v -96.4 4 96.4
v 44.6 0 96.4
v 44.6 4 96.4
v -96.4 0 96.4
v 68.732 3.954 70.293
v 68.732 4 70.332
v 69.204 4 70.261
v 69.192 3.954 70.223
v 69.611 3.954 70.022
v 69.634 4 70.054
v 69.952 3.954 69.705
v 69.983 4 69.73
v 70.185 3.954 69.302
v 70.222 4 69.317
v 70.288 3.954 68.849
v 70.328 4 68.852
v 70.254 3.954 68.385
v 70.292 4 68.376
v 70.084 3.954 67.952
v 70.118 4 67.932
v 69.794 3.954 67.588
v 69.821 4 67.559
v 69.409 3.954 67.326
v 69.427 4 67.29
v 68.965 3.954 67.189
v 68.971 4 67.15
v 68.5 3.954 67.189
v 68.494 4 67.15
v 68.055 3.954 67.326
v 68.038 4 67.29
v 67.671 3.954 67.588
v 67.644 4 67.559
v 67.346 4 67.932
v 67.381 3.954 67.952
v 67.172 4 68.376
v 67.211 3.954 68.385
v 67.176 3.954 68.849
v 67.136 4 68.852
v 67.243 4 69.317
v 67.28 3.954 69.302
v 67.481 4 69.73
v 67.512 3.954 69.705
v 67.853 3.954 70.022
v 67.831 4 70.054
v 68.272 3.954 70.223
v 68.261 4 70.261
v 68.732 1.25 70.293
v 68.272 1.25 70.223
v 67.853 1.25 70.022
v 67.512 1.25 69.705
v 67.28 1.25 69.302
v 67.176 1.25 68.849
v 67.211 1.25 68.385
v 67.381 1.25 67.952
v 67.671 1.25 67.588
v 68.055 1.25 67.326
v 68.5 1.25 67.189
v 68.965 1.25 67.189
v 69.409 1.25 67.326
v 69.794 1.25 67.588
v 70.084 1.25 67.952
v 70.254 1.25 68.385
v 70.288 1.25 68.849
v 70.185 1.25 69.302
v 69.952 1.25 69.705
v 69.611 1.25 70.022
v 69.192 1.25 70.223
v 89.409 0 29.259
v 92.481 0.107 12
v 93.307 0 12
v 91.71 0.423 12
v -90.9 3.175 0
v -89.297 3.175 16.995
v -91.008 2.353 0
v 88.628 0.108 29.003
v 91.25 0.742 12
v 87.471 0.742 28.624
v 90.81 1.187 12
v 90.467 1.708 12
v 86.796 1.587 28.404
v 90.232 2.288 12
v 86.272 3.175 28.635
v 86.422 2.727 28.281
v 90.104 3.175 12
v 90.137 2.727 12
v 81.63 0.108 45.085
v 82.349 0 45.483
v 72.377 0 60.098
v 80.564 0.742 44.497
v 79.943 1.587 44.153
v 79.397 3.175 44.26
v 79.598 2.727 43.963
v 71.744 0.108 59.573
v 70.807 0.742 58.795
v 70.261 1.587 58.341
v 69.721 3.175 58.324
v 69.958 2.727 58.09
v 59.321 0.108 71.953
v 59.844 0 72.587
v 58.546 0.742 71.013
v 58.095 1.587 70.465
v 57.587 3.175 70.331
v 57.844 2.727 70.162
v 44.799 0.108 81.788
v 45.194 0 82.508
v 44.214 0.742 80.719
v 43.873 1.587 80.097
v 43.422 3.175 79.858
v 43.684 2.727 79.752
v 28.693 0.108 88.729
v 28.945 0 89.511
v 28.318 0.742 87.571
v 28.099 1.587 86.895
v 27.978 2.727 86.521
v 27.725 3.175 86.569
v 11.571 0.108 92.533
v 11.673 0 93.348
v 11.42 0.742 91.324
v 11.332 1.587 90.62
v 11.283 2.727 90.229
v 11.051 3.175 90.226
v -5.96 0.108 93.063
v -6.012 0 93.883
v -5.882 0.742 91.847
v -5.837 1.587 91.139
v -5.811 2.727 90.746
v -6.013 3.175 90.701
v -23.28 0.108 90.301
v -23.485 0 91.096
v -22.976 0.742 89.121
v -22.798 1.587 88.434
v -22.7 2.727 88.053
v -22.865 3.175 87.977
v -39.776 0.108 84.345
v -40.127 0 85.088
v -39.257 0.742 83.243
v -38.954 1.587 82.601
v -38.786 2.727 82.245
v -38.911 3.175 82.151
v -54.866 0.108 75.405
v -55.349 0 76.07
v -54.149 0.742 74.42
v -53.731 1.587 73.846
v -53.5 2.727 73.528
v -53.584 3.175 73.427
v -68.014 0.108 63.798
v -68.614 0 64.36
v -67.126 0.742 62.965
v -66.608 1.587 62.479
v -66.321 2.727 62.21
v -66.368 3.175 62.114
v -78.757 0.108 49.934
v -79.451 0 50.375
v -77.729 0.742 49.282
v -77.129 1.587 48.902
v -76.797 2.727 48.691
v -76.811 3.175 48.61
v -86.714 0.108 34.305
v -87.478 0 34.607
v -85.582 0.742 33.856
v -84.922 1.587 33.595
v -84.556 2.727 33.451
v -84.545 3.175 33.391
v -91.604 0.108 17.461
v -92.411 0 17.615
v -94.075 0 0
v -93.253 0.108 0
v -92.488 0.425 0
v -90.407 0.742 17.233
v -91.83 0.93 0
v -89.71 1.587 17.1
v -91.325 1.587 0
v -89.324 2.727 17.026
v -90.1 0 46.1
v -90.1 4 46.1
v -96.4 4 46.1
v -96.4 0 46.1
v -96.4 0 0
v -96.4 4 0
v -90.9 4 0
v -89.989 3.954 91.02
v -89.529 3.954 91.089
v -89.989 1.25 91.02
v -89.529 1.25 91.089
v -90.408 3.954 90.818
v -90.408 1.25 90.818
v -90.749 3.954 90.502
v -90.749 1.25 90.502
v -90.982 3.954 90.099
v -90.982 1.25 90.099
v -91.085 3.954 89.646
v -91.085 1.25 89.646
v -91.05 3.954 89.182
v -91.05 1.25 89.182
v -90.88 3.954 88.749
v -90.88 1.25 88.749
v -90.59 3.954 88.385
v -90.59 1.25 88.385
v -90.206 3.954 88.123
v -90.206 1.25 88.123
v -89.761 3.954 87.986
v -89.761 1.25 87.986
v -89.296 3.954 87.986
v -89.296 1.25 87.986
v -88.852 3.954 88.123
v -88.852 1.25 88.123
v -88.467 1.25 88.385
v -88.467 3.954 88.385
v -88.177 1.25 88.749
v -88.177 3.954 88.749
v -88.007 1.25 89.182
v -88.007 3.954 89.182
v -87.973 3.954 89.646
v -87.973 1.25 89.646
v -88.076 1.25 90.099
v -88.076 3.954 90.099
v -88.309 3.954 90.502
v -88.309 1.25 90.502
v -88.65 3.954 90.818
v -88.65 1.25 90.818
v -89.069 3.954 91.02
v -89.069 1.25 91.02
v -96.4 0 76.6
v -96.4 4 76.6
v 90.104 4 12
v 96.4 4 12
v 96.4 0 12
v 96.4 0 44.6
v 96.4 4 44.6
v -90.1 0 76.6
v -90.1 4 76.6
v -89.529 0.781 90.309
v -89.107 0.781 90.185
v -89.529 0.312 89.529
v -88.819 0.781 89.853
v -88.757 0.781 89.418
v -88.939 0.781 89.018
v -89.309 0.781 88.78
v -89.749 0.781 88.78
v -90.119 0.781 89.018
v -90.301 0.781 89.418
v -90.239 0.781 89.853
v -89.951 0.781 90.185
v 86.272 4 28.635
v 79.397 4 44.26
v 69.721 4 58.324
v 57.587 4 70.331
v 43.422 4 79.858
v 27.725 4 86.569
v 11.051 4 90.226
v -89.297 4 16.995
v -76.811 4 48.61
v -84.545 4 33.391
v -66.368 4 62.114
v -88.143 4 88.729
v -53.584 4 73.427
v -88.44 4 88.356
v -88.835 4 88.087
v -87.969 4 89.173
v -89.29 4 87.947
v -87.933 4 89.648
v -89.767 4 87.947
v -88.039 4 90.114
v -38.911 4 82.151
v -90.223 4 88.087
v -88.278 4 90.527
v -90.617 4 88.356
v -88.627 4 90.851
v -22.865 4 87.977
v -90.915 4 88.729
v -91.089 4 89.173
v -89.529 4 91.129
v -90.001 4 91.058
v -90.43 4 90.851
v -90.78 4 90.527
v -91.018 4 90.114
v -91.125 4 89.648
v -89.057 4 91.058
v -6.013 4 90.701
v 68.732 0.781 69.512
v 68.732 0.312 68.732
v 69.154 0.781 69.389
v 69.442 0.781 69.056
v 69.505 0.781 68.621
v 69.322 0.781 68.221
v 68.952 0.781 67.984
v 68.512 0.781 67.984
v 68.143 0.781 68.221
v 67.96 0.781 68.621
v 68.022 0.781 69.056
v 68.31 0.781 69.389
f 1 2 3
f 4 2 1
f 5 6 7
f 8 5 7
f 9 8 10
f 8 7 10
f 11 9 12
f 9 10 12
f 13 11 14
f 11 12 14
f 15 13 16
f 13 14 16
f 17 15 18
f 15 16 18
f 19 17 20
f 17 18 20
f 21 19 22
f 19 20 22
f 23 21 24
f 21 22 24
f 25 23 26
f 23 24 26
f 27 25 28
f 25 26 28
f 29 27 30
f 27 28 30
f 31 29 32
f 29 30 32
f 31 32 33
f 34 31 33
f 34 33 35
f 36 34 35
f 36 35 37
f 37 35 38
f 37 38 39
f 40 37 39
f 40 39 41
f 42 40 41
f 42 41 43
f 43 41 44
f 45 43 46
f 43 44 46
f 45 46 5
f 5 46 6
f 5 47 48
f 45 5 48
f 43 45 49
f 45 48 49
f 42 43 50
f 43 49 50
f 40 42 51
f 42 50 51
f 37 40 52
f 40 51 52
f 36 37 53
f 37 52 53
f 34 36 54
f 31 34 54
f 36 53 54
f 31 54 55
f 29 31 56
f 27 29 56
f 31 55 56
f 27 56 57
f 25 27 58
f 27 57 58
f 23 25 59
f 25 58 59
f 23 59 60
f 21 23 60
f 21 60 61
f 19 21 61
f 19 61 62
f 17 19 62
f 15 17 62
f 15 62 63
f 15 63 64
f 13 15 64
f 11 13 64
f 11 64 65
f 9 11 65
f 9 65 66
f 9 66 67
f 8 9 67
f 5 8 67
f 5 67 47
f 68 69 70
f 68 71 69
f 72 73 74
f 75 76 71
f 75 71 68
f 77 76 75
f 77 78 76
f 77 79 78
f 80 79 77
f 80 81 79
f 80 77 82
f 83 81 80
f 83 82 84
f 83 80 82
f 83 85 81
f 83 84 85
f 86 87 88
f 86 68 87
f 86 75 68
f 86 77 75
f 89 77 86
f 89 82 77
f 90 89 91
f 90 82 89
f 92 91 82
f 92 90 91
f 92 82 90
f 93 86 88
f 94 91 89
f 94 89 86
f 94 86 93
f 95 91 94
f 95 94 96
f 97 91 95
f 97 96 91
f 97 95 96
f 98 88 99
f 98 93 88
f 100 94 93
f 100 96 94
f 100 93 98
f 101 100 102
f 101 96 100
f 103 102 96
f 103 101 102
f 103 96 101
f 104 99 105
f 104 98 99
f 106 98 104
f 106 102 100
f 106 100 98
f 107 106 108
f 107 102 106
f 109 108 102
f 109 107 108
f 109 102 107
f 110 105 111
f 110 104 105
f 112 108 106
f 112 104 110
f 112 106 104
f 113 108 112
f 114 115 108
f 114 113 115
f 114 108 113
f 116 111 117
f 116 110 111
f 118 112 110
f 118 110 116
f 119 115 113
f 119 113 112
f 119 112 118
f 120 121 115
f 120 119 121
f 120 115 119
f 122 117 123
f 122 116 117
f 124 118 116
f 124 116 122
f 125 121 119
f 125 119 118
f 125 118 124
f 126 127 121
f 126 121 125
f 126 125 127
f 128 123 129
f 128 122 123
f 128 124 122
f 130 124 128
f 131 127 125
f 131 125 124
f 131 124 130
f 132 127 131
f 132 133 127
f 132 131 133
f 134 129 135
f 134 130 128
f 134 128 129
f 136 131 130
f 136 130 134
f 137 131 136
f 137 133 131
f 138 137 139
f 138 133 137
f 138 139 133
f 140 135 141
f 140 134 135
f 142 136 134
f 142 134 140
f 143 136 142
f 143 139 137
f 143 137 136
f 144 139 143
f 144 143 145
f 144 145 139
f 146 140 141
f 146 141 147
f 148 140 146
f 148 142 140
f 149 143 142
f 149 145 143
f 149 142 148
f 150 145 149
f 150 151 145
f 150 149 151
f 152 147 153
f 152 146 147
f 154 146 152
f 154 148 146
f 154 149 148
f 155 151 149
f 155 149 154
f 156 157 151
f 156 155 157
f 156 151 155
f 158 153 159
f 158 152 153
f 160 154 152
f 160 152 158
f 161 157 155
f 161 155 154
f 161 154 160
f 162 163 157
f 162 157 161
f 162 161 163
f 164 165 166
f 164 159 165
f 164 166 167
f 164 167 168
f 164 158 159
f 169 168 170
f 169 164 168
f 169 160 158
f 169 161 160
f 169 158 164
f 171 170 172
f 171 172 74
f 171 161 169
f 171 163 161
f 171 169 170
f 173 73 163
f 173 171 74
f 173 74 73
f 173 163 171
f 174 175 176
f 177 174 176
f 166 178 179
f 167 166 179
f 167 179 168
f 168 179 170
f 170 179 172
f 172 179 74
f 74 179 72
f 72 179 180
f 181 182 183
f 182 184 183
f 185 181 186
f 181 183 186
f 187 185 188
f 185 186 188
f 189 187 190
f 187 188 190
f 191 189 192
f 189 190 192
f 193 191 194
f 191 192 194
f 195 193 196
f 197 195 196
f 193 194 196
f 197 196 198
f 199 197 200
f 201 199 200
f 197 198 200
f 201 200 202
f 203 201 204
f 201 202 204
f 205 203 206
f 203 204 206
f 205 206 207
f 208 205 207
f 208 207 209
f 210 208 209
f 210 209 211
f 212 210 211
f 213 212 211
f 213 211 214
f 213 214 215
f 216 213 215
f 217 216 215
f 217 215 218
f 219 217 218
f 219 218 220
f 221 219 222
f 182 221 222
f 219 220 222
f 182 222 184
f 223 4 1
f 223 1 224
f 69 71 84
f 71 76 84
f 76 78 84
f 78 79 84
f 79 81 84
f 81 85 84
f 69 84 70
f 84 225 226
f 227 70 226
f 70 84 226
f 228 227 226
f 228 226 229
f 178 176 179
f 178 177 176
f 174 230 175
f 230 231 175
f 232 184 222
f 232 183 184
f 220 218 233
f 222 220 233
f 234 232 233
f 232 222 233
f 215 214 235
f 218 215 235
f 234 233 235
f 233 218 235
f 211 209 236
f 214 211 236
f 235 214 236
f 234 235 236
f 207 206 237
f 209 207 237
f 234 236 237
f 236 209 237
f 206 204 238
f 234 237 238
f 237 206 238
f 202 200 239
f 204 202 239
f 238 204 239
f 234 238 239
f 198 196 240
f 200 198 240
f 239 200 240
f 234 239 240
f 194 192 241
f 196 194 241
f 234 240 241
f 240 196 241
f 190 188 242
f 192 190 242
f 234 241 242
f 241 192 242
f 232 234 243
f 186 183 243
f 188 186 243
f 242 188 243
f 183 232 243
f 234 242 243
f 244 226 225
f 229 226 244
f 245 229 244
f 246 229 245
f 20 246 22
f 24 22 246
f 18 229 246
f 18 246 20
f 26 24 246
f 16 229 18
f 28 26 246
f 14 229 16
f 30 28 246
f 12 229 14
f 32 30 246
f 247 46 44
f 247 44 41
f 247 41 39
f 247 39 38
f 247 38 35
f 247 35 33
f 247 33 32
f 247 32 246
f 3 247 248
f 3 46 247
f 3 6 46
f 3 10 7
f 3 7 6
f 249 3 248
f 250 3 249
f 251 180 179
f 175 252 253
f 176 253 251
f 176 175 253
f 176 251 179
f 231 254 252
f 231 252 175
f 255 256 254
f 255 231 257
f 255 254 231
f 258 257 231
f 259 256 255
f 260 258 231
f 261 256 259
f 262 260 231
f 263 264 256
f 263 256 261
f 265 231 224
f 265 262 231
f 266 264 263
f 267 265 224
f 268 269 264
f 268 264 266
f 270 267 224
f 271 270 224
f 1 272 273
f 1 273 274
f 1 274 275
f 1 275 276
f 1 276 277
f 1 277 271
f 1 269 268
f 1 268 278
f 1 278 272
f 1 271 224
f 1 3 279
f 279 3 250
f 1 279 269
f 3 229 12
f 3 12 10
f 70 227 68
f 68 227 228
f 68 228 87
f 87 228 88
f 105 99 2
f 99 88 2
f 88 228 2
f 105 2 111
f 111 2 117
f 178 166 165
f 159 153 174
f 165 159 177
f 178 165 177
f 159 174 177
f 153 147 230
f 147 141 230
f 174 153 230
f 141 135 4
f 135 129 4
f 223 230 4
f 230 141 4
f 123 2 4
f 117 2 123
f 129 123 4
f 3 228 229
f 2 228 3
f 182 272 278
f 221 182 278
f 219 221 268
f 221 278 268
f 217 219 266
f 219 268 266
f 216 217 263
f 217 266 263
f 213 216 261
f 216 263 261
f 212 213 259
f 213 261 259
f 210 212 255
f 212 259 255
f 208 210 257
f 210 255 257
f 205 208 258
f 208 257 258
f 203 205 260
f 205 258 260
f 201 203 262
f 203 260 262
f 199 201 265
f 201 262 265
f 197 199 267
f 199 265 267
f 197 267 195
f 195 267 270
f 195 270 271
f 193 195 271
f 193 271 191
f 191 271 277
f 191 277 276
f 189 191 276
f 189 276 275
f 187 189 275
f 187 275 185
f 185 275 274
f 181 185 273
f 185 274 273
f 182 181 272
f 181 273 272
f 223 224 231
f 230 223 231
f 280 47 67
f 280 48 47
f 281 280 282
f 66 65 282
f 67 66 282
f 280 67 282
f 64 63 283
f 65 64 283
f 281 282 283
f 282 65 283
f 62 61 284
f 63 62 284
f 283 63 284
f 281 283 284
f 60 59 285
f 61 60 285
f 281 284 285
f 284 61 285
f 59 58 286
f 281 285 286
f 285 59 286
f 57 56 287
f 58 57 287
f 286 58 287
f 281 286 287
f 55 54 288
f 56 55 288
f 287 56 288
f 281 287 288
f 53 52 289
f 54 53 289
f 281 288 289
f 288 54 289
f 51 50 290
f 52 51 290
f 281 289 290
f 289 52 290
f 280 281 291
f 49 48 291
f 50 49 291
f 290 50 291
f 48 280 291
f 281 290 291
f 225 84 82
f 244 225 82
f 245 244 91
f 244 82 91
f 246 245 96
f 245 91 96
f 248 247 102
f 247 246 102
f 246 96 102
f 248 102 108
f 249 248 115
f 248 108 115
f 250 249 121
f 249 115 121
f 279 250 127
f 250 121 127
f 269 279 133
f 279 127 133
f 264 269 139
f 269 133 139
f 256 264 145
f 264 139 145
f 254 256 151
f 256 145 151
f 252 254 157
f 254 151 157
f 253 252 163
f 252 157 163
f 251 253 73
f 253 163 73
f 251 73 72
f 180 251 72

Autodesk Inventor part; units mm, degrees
ref_plane "YZ Plane" through (0, 0, 0) normal (1, 0, 0) x (0, 1, 0)
ref_plane "XZ Plane" through (0, 0, 0) normal (0, 1, 0) x (-1, 0, 0)
ref_plane "XY Plane" through (0, 0, 0) normal (0, 0, 1) x (1, 0, 0)
sketch "Sketch1" plane through (0, 0, 0) normal (0, 1, 0) x (-1, 0, 0)
  line L0 (101.6, -101.6) -> (-101.6, -101.6)
  line L1 (-101.6, -101.6) -> (-101.6, 101.6)
  line L2 (-101.6, 101.6) -> (101.6, 101.6)
  line L3 (101.6, 101.6) -> (101.6, -101.6)
  line L4 (96.6, -96.6) -> (-96.6, -96.6)
  line L5 (-96.6, -96.6) -> (-96.6, 96.6)
  line L6 (-96.6, 96.6) -> (96.6, 96.6)
  line L7 (96.6, 96.6) -> (96.6, -96.6)
  line L8 (101.6, 101.6) -> (-40.4, 101.6)
  circle A0 centre (0, 0) radius 88.9
  line L9 (-40.4, 101.6) -> (-101.6, 40.4)
  line L10 (-45.4, 101.6) -> (-101.6, 45.4)
  line L11 (96.6, 96.6) -> (96.6, 101.6)
  line L12 (-45.4, 101.6) -> (-35.4, 101.6)
  line L13 (-35.4, 101.6) -> (-35.4, 96.6)
  line L14 (-35.4, 96.6) -> (-45.4, 96.6)
  line L15 (-45.4, 96.6) -> (-45.4, 101.6)
  line L16 (-101.6, 39.4) -> (-39.4, 101.6)
  line L17 (96.4, -96.4) -> (-96.4, -96.4)
  line L18 (-96.4, -96.4) -> (-96.4, 96.4)
  line L19 (-96.4, 96.4) -> (96.4, 96.4)
  line L20 (96.4, 96.4) -> (96.4, -96.4)
  circle A1 centre (0, 0) radius 90.9
  point P0 (96.6, 51.2168)
  point P1 (101.6, 40.4)
  point P2 (101.6, -40.4)
  point P3 (96.6, -51.2168)
  point P4 (-96.6, 45.4)
  point P5 (-45.4, 96.6)
  point P6 (-44.6, 96.4)
  point P7 (-96.4, 44.6)
  dimension "d0" = 203.2
  dimension "d1" = 203.2
  dimension "d2" = 101.6
  dimension "d3" = 101.6
  dimension "d4" = 5
  dimension "d5" = 5
  dimension "d6" = 5
  dimension "d7" = 5
  dimension "d8" = 142
  dimension "d9" = 61.2
  dimension "d10" = 177.8
  dimension "d11" = 5
  dimension "d12" = 5
  dimension "d13" = 10
  dimension "d14" = 1
  dimension "d15" = 0.2
  dimension "d16" = 0.2
  dimension "d17" = 0.2
  dimension "d18" = 0.2
  dimension "d64" = 181.8
extrude "Extrusion1" add sketch "Sketch1" along normal blind 4 contours L16 L19 L20 L17 L18
sketch "Sketch6" plane through (0, 4, 0) normal (0, 1, 0) x (1, 0, 0)
  line L0 (96.4, 96.4) -> (-96.4, 96.4) projected
  line L1 (96.4, 96.4) -> (88.4, 96.4)
  line L2 (88.4, 96.4) -> (88.4, -45.6)
  line L3 (88.4, -45.6) -> (96.4, -45.6)
  line L4 (96.4, -45.6) -> (96.4, 96.4)
  line L5 (96.4, -44.6) -> (96.4, 96.4) projected
  line L6 (88.4, -12) -> (96.4, -12)
  line L7 (96.4, -12) -> (96.4, 12)
  line L8 (96.4, 12) -> (88.4, 12)
  line L9 (88.4, 12) -> (88.4, -12)
  line L10 (0, 0) -> (96.4, 0)
  point P0 (96.4, -12)
  dimension "d58" = 8
  dimension "d59" = 142
  dimension "d62" = 12
  dimension "d63" = 12
extrude "Extrusion6" cut sketch "Sketch6" against normal blind 25.4 contours L4 L10 L2 L8 | L4 L6 L2 L10
sketch "Sketch8" plane through (0, 4, 0) normal (0, 1, 0) x (1, 0, 0)
  line L0 (-96.6, 96.6) -> (-96.6, -96.6)
  line L1 (96.6, 96.6) -> (-96.6, 96.6)
  line L2 (-96.6, 96.6) -> (96.6, 96.6)
  line L3 (96.6, -45.4) -> (45.4, -96.6)
  line L4 (96.6, 96.6) -> (96.6, -45.4)
  line L5 (96.6, -45.4) -> (45.4, -96.6)
  line L6 (45.4, -96.6) -> (-96.6, -96.6)
  line L7 (-96.6, -96.6) -> (-96.6, 96.6)
  line L8 (-96.6, 96.6) -> (-89.5289, 89.5289)
  circle A0 centre (-89.5289, 89.5289) radius 5
  circle A1 centre (-89.5289, 89.5289) radius 1.5
  line L9 (-89.5289, 84.5289) -> (-96.6, 84.5289)
  line L10 (-89.5289, 89.5289) -> (-89.5289, 84.5289)
  line L11 (-89.5289, 89.5289) -> (-84.5289, 89.5289)
  line L12 (-84.5289, 96.6) -> (-84.5289, 89.5289)
  line L13 (-96.6, -96.6) -> (-89.5289, -89.5289)
  line L14 (-96.6, -96.6) -> (-86.6, -96.6) construction
  circle A2 centre (-89.5289, -89.5289) radius 5
  circle A3 centre (-89.5289, -89.5289) radius 1.75
  line L15 (-89.5289, -89.5289) -> (-84.5289, -89.5289)
  line L16 (-84.5289, -96.6) -> (-84.5289, -89.5289)
  line L17 (-89.5289, -89.5289) -> (-89.5289, -84.5289)
  line L18 (-96.6, -84.5289) -> (-89.5289, -84.5289)
  line L19 (96.6, 96.6) -> (89.5289, 89.5289)
  circle A4 centre (89.5289, 89.5289) radius 5
  circle A5 centre (89.5289, 89.5289) radius 1.75
  line L20 (89.5289, 89.5289) -> (84.5289, 89.5289)
  line L21 (84.5289, 96.6) -> (84.5289, 89.5289)
  line L22 (89.5289, 89.5289) -> (89.5289, 84.5289)
  line L23 (96.6, 84.5289) -> (89.5289, 84.5289)
  line L24 (96.6, -43.114) -> (96.6, 96.6)
  line L25 (-96.6, -96.6) -> (43.1178, -96.6)
  line L26 (28.9914, 5.6569) -> (-5.6569, -28.9914)
  line L27 (25.4, -25.4) -> (101.6, -25.4)
  line L28 (101.6, -88.9) -> (101.6, 101.6)
  line L29 (25.4, -25.4) -> (25.4, -101.6)
  line L30 (43.1178, -101.6) -> (-101.6, -101.6)
  line L31 (96.6, -25.4) -> (86.6, -25.4)
  circle A6 centre (86.6, -25.4) radius 5
  circle A7 centre (86.6, -25.4) radius 1.75
  line L32 (25.4, -96.6) -> (25.4, -86.6)
  circle A8 centre (25.4, -86.6) radius 5
  circle A9 centre (25.4, -86.6) radius 1.75
  line L33 (44.6, -96.4) -> (96.4, -44.6) projected
  circle A10 centre (68.7322, -68.7322) radius 1
  point P0 (0, 0)
  point P1 (0, 0)
  point P2 (0, 0)
  dimension "d90" = 10
  dimension "d91" = 3
  dimension "d92" = 10
  dimension "d93" = 45
  dimension "d94" = 10
  dimension "d95" = 3.5
  dimension "d96" = 10
  dimension "d97" = 10
  dimension "d98" = 3.5
  dimension "d99" = 76.2
  dimension "d100" = 76.2
  dimension "d101" = 10
  dimension "d102" = 10
  dimension "d103" = 3.5
  dimension "d104" = 10
  dimension "d105" = 10
  dimension "d106" = 3.5
  dimension "d115" = 2
  dimension "d116" = 2.5
hole "Hole1" at (-89.5289, 4, -89.5289) at (89.5289, 4, -89.5289) at (-89.5289, 4, 89.5289) at (68.7322, 4, 68.7322) direction (0, -1, 0) diameter 3.1211 depth 2.75 tip angle 118 countersink diameter 3.2004 countersink angle 82 thread size "M3.5x0.35" class "6H" standard "ANSI Metric M Profile"
fillet "Fillet1" radius 3.175 2 edges at (-6.0132, 0, -90.7009) (-6.0132, 0, 90.7009)
sketch "Sketch9" plane through (0, 4, 0) normal (0, 1, 0) x (1, 0, 0)
  arc A0 (-101.6, -98.425) -> (-98.425, -101.6) centre (-98.425, -98.425) ccw
  line L0 (44.0849, 101.6) -> (-98.425, 101.6)
  line L1 (-101.6, 98.425) -> (-101.6, -98.425)
  line L2 (-101.6, -46.1) -> (-101.6, -76.6)
  line L3 (-96.6, -96.6) -> (-96.6, 96.6)
  line L4 (-96.6, -46.1) -> (-96.6, -76.6)
  line L5 (-101.6, -76.6) -> (-96.6, -76.6)
  line L6 (-101.6, -46.1) -> (-96.6, -46.1)
  line L7 (-98.425, -101.6) -> (101.6, -101.6)
  line L8 (0, 0) -> (-101.6, 0)
  line L9 (-101.6, 46.1) -> (-101.6, 76.6)
  line L10 (-96.6, 46.1) -> (-96.6, 76.6)
  line L11 (-101.6, 76.6) -> (-96.6, 76.6)
  line L12 (-101.6, 46.1) -> (-96.6, 46.1)
  line L13 (-96.6, -76.6) -> (-90.1, -76.6)
  line L14 (-90.1, -76.6) -> (-90.1, -46.1)
  line L15 (-90.1, -46.1) -> (-96.6, -46.1)
  line L16 (-96.6, -46.1) -> (-96.6, -76.6)
  arc A1 (-98.425, 101.6) -> (-101.6, 98.425) centre (-98.425, 98.425) ccw
  line L17 (-101.6, 46.1) -> (-96.6, 46.1)
  line L18 (-90.1, 46.1) -> (-96.6, 46.1)
  line L19 (-101.6, 46.1) -> (-101.6, 76.6)
  line L20 (-96.6, 46.1) -> (-96.6, 76.6)
  line L21 (-96.6, 46.1) -> (-96.6, 76.6)
  line L22 (-90.1, 76.6) -> (-90.1, 46.1)
  line L23 (-101.6, 76.6) -> (-96.6, 76.6)
  line L24 (-96.6, 76.6) -> (-90.1, 76.6)
  point P0 (-98.425, 98.425)
  point P1 (46.1, 101.6)
  point P2 (46.1, 96.6)
  point P3 (76.6, 96.6)
  point P4 (76.6, 101.6)
  point P5 (-46.1, 96.6)
  dimension "d117" = 30.5
  dimension "d118" = 25
  dimension "d119" = 6.5
extrude "Extrusion7" cut sketch "Sketch9" against normal blind 25.4 contours L24 L22 L18 L3 | L15 L14 L13 L3
sketch "Sketch10" plane through (0, 4, 0) normal (0, 1, 0) x (1, 0, 0)
  line L0 (-96.3514, 0) -> (-90.9, 0)
  arc A0 (90.1044, 12) -> (90.1044, -12) centre (0, 0) ccw projected
ref_plane "Work Plane1" through (-96.3514, 4, 0) normal (0, 0, 1) x (1, 0, 0)
sketch "Sketch11" plane through (-96.3514, 4, 0) normal (0, 0, 1) x (1, 0, 0)
  line L0 (-51.1439, 37.1405) -> (237.6314, 37.1405)
  line L1 (237.6314, 37.1405) -> (237.6314, -59.6996)
  line L2 (237.6314, -59.6996) -> (-51.1439, -59.6996)
  line L3 (-51.1439, -59.6996) -> (-51.1439, 37.1405)
  point P0 (96.3514, -4)
extrude "Extrusion8" cut sketch "Sketch11" against normal through all
equation "\"d1\" = d0"
equation "\"d2\" = 0.5 * d0"
equation "\"d3\" = 0.5 * d0"
equation "\"d15\" = d17"
equation "\"d16\" = d17"
equation "\"d18\" = d17"
properties part number "Drop_Plate"
